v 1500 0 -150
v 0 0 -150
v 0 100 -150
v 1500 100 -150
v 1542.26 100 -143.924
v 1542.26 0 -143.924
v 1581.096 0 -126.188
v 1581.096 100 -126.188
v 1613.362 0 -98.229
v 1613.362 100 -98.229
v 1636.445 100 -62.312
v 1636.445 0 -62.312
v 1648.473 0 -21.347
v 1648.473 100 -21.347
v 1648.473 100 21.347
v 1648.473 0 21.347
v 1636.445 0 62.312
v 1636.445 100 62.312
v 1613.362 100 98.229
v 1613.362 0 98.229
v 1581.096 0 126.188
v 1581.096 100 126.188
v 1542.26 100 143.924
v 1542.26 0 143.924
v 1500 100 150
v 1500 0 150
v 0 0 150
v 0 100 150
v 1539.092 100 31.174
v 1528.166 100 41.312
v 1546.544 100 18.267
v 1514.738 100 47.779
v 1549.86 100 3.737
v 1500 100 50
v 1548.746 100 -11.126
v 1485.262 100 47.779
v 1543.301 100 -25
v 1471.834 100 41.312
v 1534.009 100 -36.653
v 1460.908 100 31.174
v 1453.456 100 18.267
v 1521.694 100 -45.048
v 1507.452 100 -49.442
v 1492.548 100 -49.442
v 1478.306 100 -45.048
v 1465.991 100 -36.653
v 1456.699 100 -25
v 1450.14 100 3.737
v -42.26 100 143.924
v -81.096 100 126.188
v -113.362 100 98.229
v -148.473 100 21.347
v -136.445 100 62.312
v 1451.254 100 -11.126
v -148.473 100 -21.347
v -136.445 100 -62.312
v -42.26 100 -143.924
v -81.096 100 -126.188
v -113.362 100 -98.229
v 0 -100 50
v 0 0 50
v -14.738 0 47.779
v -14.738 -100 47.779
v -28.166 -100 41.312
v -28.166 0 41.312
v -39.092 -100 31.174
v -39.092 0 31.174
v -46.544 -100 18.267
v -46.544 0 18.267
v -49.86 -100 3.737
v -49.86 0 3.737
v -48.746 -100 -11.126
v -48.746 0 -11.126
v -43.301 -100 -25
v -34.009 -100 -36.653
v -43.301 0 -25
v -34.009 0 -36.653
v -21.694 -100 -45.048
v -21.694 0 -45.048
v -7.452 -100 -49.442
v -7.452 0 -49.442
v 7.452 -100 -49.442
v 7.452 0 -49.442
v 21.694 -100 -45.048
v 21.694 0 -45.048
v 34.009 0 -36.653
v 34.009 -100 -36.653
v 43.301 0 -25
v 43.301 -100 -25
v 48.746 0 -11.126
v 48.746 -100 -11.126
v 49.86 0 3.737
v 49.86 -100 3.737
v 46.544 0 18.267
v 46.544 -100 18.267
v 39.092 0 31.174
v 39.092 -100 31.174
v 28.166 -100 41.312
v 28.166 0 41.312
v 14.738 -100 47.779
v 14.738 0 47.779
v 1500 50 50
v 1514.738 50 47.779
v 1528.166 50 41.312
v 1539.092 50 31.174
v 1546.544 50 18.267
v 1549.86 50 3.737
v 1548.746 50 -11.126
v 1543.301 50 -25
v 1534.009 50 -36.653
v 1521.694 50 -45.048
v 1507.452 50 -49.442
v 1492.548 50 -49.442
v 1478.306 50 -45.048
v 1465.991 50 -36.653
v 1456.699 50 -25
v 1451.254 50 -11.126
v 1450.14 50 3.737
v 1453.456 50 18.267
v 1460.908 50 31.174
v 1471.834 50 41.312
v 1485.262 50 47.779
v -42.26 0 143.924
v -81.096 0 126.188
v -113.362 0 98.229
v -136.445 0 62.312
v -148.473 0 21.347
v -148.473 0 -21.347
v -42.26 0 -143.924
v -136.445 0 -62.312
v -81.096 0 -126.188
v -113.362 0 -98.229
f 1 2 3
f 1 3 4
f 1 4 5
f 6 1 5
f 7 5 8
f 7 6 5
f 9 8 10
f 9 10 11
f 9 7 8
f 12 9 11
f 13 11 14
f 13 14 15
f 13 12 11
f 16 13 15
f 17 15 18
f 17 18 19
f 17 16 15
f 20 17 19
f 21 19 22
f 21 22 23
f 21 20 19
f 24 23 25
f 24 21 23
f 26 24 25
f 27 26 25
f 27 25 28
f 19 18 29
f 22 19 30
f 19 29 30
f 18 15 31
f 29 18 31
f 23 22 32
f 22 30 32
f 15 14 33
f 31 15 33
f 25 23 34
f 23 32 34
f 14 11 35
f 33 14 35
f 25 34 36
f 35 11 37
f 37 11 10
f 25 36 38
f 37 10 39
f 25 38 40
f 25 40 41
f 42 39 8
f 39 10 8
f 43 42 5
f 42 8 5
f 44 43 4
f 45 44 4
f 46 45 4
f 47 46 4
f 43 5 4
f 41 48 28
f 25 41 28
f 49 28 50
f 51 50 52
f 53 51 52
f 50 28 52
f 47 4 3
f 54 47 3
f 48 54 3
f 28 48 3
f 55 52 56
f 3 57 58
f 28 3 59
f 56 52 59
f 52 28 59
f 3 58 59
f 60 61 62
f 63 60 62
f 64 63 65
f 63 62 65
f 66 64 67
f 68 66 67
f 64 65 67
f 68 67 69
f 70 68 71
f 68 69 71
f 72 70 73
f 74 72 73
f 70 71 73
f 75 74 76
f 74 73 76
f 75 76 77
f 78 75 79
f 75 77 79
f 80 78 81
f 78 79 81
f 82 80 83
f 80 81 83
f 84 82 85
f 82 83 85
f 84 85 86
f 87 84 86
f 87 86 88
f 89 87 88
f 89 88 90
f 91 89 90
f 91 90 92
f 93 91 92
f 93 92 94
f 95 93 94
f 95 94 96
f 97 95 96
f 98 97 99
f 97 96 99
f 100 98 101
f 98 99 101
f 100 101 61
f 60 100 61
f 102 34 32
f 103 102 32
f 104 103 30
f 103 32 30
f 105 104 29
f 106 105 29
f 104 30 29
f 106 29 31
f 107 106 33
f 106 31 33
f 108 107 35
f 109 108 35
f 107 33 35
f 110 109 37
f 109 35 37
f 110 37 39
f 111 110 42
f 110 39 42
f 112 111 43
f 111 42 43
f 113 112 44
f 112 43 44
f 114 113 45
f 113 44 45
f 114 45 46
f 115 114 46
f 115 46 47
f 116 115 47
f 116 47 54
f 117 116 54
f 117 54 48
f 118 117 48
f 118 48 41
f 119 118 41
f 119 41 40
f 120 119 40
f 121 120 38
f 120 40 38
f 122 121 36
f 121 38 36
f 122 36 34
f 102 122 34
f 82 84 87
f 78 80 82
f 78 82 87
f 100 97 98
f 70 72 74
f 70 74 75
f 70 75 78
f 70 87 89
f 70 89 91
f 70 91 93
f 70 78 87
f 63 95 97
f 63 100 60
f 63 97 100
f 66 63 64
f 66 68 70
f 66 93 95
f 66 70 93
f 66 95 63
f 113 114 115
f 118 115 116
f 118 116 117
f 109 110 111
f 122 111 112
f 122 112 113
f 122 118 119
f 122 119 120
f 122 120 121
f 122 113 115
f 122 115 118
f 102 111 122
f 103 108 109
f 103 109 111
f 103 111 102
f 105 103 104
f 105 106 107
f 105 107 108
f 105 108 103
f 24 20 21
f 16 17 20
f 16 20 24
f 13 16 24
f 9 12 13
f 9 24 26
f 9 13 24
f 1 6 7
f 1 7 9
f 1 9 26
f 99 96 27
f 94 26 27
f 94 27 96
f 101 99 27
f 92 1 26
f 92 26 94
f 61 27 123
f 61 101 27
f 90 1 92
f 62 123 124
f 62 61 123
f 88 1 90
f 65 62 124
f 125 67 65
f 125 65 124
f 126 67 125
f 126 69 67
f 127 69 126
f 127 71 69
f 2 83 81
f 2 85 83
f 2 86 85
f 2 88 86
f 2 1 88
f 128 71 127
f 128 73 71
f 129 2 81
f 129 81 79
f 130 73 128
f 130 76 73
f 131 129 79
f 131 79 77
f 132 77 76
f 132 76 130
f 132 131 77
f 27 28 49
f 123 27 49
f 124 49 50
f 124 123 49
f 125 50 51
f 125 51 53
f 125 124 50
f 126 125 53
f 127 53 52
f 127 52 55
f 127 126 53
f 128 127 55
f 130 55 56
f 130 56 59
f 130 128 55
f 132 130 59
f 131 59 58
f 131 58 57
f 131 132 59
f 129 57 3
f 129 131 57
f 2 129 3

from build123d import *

# Parameters (mm, degrees)
BOSS_EXTRUDE1_DEPTH = 100
SKETCH3_R           = 50
BOSS_EXTRUDE3_DEPTH = 100
SKETCH2_R           = 50
CUT_EXTRUDE1_DEPTH  = 50


with BuildPart() as part:
    # Sketch1 → Boss-Extrude1 (new body)
    with BuildSketch(Plane(origin=(0, 0, 0), x_dir=(1, 0, 0), z_dir=(0, 1, 0))):
        with BuildLine():
            Line((0, 150), (1500, 150))
            ThreePointArc((1500, 150), (1650, 0), (1500, -150))
            Line((1500, -150), (0, -150))
            ThreePointArc((0, -150), (-150, 0), (0, 150))
        make_face()
    extrude(amount=BOSS_EXTRUDE1_DEPTH)

    # Sketch3 → Boss-Extrude3 (add)
    with BuildSketch(Plane.XZ):
        with Locations(Location((0, 0, 0), (0, 0, 90))):
            Circle(SKETCH3_R)
    extrude(amount=BOSS_EXTRUDE3_DEPTH)

    # Sketch2 → Cut-Extrude1 (cut)
    with BuildSketch(Plane(origin=(0, 100, 0), x_dir=(1, 0, 0), z_dir=(0, 1, 0))):
        with Locations(Location((1500, 0, 0), (0, 0, 270))):
            Circle(SKETCH2_R)
    extrude(amount=-CUT_EXTRUDE1_DEPTH, mode=Mode.SUBTRACT)


solid = part.part
